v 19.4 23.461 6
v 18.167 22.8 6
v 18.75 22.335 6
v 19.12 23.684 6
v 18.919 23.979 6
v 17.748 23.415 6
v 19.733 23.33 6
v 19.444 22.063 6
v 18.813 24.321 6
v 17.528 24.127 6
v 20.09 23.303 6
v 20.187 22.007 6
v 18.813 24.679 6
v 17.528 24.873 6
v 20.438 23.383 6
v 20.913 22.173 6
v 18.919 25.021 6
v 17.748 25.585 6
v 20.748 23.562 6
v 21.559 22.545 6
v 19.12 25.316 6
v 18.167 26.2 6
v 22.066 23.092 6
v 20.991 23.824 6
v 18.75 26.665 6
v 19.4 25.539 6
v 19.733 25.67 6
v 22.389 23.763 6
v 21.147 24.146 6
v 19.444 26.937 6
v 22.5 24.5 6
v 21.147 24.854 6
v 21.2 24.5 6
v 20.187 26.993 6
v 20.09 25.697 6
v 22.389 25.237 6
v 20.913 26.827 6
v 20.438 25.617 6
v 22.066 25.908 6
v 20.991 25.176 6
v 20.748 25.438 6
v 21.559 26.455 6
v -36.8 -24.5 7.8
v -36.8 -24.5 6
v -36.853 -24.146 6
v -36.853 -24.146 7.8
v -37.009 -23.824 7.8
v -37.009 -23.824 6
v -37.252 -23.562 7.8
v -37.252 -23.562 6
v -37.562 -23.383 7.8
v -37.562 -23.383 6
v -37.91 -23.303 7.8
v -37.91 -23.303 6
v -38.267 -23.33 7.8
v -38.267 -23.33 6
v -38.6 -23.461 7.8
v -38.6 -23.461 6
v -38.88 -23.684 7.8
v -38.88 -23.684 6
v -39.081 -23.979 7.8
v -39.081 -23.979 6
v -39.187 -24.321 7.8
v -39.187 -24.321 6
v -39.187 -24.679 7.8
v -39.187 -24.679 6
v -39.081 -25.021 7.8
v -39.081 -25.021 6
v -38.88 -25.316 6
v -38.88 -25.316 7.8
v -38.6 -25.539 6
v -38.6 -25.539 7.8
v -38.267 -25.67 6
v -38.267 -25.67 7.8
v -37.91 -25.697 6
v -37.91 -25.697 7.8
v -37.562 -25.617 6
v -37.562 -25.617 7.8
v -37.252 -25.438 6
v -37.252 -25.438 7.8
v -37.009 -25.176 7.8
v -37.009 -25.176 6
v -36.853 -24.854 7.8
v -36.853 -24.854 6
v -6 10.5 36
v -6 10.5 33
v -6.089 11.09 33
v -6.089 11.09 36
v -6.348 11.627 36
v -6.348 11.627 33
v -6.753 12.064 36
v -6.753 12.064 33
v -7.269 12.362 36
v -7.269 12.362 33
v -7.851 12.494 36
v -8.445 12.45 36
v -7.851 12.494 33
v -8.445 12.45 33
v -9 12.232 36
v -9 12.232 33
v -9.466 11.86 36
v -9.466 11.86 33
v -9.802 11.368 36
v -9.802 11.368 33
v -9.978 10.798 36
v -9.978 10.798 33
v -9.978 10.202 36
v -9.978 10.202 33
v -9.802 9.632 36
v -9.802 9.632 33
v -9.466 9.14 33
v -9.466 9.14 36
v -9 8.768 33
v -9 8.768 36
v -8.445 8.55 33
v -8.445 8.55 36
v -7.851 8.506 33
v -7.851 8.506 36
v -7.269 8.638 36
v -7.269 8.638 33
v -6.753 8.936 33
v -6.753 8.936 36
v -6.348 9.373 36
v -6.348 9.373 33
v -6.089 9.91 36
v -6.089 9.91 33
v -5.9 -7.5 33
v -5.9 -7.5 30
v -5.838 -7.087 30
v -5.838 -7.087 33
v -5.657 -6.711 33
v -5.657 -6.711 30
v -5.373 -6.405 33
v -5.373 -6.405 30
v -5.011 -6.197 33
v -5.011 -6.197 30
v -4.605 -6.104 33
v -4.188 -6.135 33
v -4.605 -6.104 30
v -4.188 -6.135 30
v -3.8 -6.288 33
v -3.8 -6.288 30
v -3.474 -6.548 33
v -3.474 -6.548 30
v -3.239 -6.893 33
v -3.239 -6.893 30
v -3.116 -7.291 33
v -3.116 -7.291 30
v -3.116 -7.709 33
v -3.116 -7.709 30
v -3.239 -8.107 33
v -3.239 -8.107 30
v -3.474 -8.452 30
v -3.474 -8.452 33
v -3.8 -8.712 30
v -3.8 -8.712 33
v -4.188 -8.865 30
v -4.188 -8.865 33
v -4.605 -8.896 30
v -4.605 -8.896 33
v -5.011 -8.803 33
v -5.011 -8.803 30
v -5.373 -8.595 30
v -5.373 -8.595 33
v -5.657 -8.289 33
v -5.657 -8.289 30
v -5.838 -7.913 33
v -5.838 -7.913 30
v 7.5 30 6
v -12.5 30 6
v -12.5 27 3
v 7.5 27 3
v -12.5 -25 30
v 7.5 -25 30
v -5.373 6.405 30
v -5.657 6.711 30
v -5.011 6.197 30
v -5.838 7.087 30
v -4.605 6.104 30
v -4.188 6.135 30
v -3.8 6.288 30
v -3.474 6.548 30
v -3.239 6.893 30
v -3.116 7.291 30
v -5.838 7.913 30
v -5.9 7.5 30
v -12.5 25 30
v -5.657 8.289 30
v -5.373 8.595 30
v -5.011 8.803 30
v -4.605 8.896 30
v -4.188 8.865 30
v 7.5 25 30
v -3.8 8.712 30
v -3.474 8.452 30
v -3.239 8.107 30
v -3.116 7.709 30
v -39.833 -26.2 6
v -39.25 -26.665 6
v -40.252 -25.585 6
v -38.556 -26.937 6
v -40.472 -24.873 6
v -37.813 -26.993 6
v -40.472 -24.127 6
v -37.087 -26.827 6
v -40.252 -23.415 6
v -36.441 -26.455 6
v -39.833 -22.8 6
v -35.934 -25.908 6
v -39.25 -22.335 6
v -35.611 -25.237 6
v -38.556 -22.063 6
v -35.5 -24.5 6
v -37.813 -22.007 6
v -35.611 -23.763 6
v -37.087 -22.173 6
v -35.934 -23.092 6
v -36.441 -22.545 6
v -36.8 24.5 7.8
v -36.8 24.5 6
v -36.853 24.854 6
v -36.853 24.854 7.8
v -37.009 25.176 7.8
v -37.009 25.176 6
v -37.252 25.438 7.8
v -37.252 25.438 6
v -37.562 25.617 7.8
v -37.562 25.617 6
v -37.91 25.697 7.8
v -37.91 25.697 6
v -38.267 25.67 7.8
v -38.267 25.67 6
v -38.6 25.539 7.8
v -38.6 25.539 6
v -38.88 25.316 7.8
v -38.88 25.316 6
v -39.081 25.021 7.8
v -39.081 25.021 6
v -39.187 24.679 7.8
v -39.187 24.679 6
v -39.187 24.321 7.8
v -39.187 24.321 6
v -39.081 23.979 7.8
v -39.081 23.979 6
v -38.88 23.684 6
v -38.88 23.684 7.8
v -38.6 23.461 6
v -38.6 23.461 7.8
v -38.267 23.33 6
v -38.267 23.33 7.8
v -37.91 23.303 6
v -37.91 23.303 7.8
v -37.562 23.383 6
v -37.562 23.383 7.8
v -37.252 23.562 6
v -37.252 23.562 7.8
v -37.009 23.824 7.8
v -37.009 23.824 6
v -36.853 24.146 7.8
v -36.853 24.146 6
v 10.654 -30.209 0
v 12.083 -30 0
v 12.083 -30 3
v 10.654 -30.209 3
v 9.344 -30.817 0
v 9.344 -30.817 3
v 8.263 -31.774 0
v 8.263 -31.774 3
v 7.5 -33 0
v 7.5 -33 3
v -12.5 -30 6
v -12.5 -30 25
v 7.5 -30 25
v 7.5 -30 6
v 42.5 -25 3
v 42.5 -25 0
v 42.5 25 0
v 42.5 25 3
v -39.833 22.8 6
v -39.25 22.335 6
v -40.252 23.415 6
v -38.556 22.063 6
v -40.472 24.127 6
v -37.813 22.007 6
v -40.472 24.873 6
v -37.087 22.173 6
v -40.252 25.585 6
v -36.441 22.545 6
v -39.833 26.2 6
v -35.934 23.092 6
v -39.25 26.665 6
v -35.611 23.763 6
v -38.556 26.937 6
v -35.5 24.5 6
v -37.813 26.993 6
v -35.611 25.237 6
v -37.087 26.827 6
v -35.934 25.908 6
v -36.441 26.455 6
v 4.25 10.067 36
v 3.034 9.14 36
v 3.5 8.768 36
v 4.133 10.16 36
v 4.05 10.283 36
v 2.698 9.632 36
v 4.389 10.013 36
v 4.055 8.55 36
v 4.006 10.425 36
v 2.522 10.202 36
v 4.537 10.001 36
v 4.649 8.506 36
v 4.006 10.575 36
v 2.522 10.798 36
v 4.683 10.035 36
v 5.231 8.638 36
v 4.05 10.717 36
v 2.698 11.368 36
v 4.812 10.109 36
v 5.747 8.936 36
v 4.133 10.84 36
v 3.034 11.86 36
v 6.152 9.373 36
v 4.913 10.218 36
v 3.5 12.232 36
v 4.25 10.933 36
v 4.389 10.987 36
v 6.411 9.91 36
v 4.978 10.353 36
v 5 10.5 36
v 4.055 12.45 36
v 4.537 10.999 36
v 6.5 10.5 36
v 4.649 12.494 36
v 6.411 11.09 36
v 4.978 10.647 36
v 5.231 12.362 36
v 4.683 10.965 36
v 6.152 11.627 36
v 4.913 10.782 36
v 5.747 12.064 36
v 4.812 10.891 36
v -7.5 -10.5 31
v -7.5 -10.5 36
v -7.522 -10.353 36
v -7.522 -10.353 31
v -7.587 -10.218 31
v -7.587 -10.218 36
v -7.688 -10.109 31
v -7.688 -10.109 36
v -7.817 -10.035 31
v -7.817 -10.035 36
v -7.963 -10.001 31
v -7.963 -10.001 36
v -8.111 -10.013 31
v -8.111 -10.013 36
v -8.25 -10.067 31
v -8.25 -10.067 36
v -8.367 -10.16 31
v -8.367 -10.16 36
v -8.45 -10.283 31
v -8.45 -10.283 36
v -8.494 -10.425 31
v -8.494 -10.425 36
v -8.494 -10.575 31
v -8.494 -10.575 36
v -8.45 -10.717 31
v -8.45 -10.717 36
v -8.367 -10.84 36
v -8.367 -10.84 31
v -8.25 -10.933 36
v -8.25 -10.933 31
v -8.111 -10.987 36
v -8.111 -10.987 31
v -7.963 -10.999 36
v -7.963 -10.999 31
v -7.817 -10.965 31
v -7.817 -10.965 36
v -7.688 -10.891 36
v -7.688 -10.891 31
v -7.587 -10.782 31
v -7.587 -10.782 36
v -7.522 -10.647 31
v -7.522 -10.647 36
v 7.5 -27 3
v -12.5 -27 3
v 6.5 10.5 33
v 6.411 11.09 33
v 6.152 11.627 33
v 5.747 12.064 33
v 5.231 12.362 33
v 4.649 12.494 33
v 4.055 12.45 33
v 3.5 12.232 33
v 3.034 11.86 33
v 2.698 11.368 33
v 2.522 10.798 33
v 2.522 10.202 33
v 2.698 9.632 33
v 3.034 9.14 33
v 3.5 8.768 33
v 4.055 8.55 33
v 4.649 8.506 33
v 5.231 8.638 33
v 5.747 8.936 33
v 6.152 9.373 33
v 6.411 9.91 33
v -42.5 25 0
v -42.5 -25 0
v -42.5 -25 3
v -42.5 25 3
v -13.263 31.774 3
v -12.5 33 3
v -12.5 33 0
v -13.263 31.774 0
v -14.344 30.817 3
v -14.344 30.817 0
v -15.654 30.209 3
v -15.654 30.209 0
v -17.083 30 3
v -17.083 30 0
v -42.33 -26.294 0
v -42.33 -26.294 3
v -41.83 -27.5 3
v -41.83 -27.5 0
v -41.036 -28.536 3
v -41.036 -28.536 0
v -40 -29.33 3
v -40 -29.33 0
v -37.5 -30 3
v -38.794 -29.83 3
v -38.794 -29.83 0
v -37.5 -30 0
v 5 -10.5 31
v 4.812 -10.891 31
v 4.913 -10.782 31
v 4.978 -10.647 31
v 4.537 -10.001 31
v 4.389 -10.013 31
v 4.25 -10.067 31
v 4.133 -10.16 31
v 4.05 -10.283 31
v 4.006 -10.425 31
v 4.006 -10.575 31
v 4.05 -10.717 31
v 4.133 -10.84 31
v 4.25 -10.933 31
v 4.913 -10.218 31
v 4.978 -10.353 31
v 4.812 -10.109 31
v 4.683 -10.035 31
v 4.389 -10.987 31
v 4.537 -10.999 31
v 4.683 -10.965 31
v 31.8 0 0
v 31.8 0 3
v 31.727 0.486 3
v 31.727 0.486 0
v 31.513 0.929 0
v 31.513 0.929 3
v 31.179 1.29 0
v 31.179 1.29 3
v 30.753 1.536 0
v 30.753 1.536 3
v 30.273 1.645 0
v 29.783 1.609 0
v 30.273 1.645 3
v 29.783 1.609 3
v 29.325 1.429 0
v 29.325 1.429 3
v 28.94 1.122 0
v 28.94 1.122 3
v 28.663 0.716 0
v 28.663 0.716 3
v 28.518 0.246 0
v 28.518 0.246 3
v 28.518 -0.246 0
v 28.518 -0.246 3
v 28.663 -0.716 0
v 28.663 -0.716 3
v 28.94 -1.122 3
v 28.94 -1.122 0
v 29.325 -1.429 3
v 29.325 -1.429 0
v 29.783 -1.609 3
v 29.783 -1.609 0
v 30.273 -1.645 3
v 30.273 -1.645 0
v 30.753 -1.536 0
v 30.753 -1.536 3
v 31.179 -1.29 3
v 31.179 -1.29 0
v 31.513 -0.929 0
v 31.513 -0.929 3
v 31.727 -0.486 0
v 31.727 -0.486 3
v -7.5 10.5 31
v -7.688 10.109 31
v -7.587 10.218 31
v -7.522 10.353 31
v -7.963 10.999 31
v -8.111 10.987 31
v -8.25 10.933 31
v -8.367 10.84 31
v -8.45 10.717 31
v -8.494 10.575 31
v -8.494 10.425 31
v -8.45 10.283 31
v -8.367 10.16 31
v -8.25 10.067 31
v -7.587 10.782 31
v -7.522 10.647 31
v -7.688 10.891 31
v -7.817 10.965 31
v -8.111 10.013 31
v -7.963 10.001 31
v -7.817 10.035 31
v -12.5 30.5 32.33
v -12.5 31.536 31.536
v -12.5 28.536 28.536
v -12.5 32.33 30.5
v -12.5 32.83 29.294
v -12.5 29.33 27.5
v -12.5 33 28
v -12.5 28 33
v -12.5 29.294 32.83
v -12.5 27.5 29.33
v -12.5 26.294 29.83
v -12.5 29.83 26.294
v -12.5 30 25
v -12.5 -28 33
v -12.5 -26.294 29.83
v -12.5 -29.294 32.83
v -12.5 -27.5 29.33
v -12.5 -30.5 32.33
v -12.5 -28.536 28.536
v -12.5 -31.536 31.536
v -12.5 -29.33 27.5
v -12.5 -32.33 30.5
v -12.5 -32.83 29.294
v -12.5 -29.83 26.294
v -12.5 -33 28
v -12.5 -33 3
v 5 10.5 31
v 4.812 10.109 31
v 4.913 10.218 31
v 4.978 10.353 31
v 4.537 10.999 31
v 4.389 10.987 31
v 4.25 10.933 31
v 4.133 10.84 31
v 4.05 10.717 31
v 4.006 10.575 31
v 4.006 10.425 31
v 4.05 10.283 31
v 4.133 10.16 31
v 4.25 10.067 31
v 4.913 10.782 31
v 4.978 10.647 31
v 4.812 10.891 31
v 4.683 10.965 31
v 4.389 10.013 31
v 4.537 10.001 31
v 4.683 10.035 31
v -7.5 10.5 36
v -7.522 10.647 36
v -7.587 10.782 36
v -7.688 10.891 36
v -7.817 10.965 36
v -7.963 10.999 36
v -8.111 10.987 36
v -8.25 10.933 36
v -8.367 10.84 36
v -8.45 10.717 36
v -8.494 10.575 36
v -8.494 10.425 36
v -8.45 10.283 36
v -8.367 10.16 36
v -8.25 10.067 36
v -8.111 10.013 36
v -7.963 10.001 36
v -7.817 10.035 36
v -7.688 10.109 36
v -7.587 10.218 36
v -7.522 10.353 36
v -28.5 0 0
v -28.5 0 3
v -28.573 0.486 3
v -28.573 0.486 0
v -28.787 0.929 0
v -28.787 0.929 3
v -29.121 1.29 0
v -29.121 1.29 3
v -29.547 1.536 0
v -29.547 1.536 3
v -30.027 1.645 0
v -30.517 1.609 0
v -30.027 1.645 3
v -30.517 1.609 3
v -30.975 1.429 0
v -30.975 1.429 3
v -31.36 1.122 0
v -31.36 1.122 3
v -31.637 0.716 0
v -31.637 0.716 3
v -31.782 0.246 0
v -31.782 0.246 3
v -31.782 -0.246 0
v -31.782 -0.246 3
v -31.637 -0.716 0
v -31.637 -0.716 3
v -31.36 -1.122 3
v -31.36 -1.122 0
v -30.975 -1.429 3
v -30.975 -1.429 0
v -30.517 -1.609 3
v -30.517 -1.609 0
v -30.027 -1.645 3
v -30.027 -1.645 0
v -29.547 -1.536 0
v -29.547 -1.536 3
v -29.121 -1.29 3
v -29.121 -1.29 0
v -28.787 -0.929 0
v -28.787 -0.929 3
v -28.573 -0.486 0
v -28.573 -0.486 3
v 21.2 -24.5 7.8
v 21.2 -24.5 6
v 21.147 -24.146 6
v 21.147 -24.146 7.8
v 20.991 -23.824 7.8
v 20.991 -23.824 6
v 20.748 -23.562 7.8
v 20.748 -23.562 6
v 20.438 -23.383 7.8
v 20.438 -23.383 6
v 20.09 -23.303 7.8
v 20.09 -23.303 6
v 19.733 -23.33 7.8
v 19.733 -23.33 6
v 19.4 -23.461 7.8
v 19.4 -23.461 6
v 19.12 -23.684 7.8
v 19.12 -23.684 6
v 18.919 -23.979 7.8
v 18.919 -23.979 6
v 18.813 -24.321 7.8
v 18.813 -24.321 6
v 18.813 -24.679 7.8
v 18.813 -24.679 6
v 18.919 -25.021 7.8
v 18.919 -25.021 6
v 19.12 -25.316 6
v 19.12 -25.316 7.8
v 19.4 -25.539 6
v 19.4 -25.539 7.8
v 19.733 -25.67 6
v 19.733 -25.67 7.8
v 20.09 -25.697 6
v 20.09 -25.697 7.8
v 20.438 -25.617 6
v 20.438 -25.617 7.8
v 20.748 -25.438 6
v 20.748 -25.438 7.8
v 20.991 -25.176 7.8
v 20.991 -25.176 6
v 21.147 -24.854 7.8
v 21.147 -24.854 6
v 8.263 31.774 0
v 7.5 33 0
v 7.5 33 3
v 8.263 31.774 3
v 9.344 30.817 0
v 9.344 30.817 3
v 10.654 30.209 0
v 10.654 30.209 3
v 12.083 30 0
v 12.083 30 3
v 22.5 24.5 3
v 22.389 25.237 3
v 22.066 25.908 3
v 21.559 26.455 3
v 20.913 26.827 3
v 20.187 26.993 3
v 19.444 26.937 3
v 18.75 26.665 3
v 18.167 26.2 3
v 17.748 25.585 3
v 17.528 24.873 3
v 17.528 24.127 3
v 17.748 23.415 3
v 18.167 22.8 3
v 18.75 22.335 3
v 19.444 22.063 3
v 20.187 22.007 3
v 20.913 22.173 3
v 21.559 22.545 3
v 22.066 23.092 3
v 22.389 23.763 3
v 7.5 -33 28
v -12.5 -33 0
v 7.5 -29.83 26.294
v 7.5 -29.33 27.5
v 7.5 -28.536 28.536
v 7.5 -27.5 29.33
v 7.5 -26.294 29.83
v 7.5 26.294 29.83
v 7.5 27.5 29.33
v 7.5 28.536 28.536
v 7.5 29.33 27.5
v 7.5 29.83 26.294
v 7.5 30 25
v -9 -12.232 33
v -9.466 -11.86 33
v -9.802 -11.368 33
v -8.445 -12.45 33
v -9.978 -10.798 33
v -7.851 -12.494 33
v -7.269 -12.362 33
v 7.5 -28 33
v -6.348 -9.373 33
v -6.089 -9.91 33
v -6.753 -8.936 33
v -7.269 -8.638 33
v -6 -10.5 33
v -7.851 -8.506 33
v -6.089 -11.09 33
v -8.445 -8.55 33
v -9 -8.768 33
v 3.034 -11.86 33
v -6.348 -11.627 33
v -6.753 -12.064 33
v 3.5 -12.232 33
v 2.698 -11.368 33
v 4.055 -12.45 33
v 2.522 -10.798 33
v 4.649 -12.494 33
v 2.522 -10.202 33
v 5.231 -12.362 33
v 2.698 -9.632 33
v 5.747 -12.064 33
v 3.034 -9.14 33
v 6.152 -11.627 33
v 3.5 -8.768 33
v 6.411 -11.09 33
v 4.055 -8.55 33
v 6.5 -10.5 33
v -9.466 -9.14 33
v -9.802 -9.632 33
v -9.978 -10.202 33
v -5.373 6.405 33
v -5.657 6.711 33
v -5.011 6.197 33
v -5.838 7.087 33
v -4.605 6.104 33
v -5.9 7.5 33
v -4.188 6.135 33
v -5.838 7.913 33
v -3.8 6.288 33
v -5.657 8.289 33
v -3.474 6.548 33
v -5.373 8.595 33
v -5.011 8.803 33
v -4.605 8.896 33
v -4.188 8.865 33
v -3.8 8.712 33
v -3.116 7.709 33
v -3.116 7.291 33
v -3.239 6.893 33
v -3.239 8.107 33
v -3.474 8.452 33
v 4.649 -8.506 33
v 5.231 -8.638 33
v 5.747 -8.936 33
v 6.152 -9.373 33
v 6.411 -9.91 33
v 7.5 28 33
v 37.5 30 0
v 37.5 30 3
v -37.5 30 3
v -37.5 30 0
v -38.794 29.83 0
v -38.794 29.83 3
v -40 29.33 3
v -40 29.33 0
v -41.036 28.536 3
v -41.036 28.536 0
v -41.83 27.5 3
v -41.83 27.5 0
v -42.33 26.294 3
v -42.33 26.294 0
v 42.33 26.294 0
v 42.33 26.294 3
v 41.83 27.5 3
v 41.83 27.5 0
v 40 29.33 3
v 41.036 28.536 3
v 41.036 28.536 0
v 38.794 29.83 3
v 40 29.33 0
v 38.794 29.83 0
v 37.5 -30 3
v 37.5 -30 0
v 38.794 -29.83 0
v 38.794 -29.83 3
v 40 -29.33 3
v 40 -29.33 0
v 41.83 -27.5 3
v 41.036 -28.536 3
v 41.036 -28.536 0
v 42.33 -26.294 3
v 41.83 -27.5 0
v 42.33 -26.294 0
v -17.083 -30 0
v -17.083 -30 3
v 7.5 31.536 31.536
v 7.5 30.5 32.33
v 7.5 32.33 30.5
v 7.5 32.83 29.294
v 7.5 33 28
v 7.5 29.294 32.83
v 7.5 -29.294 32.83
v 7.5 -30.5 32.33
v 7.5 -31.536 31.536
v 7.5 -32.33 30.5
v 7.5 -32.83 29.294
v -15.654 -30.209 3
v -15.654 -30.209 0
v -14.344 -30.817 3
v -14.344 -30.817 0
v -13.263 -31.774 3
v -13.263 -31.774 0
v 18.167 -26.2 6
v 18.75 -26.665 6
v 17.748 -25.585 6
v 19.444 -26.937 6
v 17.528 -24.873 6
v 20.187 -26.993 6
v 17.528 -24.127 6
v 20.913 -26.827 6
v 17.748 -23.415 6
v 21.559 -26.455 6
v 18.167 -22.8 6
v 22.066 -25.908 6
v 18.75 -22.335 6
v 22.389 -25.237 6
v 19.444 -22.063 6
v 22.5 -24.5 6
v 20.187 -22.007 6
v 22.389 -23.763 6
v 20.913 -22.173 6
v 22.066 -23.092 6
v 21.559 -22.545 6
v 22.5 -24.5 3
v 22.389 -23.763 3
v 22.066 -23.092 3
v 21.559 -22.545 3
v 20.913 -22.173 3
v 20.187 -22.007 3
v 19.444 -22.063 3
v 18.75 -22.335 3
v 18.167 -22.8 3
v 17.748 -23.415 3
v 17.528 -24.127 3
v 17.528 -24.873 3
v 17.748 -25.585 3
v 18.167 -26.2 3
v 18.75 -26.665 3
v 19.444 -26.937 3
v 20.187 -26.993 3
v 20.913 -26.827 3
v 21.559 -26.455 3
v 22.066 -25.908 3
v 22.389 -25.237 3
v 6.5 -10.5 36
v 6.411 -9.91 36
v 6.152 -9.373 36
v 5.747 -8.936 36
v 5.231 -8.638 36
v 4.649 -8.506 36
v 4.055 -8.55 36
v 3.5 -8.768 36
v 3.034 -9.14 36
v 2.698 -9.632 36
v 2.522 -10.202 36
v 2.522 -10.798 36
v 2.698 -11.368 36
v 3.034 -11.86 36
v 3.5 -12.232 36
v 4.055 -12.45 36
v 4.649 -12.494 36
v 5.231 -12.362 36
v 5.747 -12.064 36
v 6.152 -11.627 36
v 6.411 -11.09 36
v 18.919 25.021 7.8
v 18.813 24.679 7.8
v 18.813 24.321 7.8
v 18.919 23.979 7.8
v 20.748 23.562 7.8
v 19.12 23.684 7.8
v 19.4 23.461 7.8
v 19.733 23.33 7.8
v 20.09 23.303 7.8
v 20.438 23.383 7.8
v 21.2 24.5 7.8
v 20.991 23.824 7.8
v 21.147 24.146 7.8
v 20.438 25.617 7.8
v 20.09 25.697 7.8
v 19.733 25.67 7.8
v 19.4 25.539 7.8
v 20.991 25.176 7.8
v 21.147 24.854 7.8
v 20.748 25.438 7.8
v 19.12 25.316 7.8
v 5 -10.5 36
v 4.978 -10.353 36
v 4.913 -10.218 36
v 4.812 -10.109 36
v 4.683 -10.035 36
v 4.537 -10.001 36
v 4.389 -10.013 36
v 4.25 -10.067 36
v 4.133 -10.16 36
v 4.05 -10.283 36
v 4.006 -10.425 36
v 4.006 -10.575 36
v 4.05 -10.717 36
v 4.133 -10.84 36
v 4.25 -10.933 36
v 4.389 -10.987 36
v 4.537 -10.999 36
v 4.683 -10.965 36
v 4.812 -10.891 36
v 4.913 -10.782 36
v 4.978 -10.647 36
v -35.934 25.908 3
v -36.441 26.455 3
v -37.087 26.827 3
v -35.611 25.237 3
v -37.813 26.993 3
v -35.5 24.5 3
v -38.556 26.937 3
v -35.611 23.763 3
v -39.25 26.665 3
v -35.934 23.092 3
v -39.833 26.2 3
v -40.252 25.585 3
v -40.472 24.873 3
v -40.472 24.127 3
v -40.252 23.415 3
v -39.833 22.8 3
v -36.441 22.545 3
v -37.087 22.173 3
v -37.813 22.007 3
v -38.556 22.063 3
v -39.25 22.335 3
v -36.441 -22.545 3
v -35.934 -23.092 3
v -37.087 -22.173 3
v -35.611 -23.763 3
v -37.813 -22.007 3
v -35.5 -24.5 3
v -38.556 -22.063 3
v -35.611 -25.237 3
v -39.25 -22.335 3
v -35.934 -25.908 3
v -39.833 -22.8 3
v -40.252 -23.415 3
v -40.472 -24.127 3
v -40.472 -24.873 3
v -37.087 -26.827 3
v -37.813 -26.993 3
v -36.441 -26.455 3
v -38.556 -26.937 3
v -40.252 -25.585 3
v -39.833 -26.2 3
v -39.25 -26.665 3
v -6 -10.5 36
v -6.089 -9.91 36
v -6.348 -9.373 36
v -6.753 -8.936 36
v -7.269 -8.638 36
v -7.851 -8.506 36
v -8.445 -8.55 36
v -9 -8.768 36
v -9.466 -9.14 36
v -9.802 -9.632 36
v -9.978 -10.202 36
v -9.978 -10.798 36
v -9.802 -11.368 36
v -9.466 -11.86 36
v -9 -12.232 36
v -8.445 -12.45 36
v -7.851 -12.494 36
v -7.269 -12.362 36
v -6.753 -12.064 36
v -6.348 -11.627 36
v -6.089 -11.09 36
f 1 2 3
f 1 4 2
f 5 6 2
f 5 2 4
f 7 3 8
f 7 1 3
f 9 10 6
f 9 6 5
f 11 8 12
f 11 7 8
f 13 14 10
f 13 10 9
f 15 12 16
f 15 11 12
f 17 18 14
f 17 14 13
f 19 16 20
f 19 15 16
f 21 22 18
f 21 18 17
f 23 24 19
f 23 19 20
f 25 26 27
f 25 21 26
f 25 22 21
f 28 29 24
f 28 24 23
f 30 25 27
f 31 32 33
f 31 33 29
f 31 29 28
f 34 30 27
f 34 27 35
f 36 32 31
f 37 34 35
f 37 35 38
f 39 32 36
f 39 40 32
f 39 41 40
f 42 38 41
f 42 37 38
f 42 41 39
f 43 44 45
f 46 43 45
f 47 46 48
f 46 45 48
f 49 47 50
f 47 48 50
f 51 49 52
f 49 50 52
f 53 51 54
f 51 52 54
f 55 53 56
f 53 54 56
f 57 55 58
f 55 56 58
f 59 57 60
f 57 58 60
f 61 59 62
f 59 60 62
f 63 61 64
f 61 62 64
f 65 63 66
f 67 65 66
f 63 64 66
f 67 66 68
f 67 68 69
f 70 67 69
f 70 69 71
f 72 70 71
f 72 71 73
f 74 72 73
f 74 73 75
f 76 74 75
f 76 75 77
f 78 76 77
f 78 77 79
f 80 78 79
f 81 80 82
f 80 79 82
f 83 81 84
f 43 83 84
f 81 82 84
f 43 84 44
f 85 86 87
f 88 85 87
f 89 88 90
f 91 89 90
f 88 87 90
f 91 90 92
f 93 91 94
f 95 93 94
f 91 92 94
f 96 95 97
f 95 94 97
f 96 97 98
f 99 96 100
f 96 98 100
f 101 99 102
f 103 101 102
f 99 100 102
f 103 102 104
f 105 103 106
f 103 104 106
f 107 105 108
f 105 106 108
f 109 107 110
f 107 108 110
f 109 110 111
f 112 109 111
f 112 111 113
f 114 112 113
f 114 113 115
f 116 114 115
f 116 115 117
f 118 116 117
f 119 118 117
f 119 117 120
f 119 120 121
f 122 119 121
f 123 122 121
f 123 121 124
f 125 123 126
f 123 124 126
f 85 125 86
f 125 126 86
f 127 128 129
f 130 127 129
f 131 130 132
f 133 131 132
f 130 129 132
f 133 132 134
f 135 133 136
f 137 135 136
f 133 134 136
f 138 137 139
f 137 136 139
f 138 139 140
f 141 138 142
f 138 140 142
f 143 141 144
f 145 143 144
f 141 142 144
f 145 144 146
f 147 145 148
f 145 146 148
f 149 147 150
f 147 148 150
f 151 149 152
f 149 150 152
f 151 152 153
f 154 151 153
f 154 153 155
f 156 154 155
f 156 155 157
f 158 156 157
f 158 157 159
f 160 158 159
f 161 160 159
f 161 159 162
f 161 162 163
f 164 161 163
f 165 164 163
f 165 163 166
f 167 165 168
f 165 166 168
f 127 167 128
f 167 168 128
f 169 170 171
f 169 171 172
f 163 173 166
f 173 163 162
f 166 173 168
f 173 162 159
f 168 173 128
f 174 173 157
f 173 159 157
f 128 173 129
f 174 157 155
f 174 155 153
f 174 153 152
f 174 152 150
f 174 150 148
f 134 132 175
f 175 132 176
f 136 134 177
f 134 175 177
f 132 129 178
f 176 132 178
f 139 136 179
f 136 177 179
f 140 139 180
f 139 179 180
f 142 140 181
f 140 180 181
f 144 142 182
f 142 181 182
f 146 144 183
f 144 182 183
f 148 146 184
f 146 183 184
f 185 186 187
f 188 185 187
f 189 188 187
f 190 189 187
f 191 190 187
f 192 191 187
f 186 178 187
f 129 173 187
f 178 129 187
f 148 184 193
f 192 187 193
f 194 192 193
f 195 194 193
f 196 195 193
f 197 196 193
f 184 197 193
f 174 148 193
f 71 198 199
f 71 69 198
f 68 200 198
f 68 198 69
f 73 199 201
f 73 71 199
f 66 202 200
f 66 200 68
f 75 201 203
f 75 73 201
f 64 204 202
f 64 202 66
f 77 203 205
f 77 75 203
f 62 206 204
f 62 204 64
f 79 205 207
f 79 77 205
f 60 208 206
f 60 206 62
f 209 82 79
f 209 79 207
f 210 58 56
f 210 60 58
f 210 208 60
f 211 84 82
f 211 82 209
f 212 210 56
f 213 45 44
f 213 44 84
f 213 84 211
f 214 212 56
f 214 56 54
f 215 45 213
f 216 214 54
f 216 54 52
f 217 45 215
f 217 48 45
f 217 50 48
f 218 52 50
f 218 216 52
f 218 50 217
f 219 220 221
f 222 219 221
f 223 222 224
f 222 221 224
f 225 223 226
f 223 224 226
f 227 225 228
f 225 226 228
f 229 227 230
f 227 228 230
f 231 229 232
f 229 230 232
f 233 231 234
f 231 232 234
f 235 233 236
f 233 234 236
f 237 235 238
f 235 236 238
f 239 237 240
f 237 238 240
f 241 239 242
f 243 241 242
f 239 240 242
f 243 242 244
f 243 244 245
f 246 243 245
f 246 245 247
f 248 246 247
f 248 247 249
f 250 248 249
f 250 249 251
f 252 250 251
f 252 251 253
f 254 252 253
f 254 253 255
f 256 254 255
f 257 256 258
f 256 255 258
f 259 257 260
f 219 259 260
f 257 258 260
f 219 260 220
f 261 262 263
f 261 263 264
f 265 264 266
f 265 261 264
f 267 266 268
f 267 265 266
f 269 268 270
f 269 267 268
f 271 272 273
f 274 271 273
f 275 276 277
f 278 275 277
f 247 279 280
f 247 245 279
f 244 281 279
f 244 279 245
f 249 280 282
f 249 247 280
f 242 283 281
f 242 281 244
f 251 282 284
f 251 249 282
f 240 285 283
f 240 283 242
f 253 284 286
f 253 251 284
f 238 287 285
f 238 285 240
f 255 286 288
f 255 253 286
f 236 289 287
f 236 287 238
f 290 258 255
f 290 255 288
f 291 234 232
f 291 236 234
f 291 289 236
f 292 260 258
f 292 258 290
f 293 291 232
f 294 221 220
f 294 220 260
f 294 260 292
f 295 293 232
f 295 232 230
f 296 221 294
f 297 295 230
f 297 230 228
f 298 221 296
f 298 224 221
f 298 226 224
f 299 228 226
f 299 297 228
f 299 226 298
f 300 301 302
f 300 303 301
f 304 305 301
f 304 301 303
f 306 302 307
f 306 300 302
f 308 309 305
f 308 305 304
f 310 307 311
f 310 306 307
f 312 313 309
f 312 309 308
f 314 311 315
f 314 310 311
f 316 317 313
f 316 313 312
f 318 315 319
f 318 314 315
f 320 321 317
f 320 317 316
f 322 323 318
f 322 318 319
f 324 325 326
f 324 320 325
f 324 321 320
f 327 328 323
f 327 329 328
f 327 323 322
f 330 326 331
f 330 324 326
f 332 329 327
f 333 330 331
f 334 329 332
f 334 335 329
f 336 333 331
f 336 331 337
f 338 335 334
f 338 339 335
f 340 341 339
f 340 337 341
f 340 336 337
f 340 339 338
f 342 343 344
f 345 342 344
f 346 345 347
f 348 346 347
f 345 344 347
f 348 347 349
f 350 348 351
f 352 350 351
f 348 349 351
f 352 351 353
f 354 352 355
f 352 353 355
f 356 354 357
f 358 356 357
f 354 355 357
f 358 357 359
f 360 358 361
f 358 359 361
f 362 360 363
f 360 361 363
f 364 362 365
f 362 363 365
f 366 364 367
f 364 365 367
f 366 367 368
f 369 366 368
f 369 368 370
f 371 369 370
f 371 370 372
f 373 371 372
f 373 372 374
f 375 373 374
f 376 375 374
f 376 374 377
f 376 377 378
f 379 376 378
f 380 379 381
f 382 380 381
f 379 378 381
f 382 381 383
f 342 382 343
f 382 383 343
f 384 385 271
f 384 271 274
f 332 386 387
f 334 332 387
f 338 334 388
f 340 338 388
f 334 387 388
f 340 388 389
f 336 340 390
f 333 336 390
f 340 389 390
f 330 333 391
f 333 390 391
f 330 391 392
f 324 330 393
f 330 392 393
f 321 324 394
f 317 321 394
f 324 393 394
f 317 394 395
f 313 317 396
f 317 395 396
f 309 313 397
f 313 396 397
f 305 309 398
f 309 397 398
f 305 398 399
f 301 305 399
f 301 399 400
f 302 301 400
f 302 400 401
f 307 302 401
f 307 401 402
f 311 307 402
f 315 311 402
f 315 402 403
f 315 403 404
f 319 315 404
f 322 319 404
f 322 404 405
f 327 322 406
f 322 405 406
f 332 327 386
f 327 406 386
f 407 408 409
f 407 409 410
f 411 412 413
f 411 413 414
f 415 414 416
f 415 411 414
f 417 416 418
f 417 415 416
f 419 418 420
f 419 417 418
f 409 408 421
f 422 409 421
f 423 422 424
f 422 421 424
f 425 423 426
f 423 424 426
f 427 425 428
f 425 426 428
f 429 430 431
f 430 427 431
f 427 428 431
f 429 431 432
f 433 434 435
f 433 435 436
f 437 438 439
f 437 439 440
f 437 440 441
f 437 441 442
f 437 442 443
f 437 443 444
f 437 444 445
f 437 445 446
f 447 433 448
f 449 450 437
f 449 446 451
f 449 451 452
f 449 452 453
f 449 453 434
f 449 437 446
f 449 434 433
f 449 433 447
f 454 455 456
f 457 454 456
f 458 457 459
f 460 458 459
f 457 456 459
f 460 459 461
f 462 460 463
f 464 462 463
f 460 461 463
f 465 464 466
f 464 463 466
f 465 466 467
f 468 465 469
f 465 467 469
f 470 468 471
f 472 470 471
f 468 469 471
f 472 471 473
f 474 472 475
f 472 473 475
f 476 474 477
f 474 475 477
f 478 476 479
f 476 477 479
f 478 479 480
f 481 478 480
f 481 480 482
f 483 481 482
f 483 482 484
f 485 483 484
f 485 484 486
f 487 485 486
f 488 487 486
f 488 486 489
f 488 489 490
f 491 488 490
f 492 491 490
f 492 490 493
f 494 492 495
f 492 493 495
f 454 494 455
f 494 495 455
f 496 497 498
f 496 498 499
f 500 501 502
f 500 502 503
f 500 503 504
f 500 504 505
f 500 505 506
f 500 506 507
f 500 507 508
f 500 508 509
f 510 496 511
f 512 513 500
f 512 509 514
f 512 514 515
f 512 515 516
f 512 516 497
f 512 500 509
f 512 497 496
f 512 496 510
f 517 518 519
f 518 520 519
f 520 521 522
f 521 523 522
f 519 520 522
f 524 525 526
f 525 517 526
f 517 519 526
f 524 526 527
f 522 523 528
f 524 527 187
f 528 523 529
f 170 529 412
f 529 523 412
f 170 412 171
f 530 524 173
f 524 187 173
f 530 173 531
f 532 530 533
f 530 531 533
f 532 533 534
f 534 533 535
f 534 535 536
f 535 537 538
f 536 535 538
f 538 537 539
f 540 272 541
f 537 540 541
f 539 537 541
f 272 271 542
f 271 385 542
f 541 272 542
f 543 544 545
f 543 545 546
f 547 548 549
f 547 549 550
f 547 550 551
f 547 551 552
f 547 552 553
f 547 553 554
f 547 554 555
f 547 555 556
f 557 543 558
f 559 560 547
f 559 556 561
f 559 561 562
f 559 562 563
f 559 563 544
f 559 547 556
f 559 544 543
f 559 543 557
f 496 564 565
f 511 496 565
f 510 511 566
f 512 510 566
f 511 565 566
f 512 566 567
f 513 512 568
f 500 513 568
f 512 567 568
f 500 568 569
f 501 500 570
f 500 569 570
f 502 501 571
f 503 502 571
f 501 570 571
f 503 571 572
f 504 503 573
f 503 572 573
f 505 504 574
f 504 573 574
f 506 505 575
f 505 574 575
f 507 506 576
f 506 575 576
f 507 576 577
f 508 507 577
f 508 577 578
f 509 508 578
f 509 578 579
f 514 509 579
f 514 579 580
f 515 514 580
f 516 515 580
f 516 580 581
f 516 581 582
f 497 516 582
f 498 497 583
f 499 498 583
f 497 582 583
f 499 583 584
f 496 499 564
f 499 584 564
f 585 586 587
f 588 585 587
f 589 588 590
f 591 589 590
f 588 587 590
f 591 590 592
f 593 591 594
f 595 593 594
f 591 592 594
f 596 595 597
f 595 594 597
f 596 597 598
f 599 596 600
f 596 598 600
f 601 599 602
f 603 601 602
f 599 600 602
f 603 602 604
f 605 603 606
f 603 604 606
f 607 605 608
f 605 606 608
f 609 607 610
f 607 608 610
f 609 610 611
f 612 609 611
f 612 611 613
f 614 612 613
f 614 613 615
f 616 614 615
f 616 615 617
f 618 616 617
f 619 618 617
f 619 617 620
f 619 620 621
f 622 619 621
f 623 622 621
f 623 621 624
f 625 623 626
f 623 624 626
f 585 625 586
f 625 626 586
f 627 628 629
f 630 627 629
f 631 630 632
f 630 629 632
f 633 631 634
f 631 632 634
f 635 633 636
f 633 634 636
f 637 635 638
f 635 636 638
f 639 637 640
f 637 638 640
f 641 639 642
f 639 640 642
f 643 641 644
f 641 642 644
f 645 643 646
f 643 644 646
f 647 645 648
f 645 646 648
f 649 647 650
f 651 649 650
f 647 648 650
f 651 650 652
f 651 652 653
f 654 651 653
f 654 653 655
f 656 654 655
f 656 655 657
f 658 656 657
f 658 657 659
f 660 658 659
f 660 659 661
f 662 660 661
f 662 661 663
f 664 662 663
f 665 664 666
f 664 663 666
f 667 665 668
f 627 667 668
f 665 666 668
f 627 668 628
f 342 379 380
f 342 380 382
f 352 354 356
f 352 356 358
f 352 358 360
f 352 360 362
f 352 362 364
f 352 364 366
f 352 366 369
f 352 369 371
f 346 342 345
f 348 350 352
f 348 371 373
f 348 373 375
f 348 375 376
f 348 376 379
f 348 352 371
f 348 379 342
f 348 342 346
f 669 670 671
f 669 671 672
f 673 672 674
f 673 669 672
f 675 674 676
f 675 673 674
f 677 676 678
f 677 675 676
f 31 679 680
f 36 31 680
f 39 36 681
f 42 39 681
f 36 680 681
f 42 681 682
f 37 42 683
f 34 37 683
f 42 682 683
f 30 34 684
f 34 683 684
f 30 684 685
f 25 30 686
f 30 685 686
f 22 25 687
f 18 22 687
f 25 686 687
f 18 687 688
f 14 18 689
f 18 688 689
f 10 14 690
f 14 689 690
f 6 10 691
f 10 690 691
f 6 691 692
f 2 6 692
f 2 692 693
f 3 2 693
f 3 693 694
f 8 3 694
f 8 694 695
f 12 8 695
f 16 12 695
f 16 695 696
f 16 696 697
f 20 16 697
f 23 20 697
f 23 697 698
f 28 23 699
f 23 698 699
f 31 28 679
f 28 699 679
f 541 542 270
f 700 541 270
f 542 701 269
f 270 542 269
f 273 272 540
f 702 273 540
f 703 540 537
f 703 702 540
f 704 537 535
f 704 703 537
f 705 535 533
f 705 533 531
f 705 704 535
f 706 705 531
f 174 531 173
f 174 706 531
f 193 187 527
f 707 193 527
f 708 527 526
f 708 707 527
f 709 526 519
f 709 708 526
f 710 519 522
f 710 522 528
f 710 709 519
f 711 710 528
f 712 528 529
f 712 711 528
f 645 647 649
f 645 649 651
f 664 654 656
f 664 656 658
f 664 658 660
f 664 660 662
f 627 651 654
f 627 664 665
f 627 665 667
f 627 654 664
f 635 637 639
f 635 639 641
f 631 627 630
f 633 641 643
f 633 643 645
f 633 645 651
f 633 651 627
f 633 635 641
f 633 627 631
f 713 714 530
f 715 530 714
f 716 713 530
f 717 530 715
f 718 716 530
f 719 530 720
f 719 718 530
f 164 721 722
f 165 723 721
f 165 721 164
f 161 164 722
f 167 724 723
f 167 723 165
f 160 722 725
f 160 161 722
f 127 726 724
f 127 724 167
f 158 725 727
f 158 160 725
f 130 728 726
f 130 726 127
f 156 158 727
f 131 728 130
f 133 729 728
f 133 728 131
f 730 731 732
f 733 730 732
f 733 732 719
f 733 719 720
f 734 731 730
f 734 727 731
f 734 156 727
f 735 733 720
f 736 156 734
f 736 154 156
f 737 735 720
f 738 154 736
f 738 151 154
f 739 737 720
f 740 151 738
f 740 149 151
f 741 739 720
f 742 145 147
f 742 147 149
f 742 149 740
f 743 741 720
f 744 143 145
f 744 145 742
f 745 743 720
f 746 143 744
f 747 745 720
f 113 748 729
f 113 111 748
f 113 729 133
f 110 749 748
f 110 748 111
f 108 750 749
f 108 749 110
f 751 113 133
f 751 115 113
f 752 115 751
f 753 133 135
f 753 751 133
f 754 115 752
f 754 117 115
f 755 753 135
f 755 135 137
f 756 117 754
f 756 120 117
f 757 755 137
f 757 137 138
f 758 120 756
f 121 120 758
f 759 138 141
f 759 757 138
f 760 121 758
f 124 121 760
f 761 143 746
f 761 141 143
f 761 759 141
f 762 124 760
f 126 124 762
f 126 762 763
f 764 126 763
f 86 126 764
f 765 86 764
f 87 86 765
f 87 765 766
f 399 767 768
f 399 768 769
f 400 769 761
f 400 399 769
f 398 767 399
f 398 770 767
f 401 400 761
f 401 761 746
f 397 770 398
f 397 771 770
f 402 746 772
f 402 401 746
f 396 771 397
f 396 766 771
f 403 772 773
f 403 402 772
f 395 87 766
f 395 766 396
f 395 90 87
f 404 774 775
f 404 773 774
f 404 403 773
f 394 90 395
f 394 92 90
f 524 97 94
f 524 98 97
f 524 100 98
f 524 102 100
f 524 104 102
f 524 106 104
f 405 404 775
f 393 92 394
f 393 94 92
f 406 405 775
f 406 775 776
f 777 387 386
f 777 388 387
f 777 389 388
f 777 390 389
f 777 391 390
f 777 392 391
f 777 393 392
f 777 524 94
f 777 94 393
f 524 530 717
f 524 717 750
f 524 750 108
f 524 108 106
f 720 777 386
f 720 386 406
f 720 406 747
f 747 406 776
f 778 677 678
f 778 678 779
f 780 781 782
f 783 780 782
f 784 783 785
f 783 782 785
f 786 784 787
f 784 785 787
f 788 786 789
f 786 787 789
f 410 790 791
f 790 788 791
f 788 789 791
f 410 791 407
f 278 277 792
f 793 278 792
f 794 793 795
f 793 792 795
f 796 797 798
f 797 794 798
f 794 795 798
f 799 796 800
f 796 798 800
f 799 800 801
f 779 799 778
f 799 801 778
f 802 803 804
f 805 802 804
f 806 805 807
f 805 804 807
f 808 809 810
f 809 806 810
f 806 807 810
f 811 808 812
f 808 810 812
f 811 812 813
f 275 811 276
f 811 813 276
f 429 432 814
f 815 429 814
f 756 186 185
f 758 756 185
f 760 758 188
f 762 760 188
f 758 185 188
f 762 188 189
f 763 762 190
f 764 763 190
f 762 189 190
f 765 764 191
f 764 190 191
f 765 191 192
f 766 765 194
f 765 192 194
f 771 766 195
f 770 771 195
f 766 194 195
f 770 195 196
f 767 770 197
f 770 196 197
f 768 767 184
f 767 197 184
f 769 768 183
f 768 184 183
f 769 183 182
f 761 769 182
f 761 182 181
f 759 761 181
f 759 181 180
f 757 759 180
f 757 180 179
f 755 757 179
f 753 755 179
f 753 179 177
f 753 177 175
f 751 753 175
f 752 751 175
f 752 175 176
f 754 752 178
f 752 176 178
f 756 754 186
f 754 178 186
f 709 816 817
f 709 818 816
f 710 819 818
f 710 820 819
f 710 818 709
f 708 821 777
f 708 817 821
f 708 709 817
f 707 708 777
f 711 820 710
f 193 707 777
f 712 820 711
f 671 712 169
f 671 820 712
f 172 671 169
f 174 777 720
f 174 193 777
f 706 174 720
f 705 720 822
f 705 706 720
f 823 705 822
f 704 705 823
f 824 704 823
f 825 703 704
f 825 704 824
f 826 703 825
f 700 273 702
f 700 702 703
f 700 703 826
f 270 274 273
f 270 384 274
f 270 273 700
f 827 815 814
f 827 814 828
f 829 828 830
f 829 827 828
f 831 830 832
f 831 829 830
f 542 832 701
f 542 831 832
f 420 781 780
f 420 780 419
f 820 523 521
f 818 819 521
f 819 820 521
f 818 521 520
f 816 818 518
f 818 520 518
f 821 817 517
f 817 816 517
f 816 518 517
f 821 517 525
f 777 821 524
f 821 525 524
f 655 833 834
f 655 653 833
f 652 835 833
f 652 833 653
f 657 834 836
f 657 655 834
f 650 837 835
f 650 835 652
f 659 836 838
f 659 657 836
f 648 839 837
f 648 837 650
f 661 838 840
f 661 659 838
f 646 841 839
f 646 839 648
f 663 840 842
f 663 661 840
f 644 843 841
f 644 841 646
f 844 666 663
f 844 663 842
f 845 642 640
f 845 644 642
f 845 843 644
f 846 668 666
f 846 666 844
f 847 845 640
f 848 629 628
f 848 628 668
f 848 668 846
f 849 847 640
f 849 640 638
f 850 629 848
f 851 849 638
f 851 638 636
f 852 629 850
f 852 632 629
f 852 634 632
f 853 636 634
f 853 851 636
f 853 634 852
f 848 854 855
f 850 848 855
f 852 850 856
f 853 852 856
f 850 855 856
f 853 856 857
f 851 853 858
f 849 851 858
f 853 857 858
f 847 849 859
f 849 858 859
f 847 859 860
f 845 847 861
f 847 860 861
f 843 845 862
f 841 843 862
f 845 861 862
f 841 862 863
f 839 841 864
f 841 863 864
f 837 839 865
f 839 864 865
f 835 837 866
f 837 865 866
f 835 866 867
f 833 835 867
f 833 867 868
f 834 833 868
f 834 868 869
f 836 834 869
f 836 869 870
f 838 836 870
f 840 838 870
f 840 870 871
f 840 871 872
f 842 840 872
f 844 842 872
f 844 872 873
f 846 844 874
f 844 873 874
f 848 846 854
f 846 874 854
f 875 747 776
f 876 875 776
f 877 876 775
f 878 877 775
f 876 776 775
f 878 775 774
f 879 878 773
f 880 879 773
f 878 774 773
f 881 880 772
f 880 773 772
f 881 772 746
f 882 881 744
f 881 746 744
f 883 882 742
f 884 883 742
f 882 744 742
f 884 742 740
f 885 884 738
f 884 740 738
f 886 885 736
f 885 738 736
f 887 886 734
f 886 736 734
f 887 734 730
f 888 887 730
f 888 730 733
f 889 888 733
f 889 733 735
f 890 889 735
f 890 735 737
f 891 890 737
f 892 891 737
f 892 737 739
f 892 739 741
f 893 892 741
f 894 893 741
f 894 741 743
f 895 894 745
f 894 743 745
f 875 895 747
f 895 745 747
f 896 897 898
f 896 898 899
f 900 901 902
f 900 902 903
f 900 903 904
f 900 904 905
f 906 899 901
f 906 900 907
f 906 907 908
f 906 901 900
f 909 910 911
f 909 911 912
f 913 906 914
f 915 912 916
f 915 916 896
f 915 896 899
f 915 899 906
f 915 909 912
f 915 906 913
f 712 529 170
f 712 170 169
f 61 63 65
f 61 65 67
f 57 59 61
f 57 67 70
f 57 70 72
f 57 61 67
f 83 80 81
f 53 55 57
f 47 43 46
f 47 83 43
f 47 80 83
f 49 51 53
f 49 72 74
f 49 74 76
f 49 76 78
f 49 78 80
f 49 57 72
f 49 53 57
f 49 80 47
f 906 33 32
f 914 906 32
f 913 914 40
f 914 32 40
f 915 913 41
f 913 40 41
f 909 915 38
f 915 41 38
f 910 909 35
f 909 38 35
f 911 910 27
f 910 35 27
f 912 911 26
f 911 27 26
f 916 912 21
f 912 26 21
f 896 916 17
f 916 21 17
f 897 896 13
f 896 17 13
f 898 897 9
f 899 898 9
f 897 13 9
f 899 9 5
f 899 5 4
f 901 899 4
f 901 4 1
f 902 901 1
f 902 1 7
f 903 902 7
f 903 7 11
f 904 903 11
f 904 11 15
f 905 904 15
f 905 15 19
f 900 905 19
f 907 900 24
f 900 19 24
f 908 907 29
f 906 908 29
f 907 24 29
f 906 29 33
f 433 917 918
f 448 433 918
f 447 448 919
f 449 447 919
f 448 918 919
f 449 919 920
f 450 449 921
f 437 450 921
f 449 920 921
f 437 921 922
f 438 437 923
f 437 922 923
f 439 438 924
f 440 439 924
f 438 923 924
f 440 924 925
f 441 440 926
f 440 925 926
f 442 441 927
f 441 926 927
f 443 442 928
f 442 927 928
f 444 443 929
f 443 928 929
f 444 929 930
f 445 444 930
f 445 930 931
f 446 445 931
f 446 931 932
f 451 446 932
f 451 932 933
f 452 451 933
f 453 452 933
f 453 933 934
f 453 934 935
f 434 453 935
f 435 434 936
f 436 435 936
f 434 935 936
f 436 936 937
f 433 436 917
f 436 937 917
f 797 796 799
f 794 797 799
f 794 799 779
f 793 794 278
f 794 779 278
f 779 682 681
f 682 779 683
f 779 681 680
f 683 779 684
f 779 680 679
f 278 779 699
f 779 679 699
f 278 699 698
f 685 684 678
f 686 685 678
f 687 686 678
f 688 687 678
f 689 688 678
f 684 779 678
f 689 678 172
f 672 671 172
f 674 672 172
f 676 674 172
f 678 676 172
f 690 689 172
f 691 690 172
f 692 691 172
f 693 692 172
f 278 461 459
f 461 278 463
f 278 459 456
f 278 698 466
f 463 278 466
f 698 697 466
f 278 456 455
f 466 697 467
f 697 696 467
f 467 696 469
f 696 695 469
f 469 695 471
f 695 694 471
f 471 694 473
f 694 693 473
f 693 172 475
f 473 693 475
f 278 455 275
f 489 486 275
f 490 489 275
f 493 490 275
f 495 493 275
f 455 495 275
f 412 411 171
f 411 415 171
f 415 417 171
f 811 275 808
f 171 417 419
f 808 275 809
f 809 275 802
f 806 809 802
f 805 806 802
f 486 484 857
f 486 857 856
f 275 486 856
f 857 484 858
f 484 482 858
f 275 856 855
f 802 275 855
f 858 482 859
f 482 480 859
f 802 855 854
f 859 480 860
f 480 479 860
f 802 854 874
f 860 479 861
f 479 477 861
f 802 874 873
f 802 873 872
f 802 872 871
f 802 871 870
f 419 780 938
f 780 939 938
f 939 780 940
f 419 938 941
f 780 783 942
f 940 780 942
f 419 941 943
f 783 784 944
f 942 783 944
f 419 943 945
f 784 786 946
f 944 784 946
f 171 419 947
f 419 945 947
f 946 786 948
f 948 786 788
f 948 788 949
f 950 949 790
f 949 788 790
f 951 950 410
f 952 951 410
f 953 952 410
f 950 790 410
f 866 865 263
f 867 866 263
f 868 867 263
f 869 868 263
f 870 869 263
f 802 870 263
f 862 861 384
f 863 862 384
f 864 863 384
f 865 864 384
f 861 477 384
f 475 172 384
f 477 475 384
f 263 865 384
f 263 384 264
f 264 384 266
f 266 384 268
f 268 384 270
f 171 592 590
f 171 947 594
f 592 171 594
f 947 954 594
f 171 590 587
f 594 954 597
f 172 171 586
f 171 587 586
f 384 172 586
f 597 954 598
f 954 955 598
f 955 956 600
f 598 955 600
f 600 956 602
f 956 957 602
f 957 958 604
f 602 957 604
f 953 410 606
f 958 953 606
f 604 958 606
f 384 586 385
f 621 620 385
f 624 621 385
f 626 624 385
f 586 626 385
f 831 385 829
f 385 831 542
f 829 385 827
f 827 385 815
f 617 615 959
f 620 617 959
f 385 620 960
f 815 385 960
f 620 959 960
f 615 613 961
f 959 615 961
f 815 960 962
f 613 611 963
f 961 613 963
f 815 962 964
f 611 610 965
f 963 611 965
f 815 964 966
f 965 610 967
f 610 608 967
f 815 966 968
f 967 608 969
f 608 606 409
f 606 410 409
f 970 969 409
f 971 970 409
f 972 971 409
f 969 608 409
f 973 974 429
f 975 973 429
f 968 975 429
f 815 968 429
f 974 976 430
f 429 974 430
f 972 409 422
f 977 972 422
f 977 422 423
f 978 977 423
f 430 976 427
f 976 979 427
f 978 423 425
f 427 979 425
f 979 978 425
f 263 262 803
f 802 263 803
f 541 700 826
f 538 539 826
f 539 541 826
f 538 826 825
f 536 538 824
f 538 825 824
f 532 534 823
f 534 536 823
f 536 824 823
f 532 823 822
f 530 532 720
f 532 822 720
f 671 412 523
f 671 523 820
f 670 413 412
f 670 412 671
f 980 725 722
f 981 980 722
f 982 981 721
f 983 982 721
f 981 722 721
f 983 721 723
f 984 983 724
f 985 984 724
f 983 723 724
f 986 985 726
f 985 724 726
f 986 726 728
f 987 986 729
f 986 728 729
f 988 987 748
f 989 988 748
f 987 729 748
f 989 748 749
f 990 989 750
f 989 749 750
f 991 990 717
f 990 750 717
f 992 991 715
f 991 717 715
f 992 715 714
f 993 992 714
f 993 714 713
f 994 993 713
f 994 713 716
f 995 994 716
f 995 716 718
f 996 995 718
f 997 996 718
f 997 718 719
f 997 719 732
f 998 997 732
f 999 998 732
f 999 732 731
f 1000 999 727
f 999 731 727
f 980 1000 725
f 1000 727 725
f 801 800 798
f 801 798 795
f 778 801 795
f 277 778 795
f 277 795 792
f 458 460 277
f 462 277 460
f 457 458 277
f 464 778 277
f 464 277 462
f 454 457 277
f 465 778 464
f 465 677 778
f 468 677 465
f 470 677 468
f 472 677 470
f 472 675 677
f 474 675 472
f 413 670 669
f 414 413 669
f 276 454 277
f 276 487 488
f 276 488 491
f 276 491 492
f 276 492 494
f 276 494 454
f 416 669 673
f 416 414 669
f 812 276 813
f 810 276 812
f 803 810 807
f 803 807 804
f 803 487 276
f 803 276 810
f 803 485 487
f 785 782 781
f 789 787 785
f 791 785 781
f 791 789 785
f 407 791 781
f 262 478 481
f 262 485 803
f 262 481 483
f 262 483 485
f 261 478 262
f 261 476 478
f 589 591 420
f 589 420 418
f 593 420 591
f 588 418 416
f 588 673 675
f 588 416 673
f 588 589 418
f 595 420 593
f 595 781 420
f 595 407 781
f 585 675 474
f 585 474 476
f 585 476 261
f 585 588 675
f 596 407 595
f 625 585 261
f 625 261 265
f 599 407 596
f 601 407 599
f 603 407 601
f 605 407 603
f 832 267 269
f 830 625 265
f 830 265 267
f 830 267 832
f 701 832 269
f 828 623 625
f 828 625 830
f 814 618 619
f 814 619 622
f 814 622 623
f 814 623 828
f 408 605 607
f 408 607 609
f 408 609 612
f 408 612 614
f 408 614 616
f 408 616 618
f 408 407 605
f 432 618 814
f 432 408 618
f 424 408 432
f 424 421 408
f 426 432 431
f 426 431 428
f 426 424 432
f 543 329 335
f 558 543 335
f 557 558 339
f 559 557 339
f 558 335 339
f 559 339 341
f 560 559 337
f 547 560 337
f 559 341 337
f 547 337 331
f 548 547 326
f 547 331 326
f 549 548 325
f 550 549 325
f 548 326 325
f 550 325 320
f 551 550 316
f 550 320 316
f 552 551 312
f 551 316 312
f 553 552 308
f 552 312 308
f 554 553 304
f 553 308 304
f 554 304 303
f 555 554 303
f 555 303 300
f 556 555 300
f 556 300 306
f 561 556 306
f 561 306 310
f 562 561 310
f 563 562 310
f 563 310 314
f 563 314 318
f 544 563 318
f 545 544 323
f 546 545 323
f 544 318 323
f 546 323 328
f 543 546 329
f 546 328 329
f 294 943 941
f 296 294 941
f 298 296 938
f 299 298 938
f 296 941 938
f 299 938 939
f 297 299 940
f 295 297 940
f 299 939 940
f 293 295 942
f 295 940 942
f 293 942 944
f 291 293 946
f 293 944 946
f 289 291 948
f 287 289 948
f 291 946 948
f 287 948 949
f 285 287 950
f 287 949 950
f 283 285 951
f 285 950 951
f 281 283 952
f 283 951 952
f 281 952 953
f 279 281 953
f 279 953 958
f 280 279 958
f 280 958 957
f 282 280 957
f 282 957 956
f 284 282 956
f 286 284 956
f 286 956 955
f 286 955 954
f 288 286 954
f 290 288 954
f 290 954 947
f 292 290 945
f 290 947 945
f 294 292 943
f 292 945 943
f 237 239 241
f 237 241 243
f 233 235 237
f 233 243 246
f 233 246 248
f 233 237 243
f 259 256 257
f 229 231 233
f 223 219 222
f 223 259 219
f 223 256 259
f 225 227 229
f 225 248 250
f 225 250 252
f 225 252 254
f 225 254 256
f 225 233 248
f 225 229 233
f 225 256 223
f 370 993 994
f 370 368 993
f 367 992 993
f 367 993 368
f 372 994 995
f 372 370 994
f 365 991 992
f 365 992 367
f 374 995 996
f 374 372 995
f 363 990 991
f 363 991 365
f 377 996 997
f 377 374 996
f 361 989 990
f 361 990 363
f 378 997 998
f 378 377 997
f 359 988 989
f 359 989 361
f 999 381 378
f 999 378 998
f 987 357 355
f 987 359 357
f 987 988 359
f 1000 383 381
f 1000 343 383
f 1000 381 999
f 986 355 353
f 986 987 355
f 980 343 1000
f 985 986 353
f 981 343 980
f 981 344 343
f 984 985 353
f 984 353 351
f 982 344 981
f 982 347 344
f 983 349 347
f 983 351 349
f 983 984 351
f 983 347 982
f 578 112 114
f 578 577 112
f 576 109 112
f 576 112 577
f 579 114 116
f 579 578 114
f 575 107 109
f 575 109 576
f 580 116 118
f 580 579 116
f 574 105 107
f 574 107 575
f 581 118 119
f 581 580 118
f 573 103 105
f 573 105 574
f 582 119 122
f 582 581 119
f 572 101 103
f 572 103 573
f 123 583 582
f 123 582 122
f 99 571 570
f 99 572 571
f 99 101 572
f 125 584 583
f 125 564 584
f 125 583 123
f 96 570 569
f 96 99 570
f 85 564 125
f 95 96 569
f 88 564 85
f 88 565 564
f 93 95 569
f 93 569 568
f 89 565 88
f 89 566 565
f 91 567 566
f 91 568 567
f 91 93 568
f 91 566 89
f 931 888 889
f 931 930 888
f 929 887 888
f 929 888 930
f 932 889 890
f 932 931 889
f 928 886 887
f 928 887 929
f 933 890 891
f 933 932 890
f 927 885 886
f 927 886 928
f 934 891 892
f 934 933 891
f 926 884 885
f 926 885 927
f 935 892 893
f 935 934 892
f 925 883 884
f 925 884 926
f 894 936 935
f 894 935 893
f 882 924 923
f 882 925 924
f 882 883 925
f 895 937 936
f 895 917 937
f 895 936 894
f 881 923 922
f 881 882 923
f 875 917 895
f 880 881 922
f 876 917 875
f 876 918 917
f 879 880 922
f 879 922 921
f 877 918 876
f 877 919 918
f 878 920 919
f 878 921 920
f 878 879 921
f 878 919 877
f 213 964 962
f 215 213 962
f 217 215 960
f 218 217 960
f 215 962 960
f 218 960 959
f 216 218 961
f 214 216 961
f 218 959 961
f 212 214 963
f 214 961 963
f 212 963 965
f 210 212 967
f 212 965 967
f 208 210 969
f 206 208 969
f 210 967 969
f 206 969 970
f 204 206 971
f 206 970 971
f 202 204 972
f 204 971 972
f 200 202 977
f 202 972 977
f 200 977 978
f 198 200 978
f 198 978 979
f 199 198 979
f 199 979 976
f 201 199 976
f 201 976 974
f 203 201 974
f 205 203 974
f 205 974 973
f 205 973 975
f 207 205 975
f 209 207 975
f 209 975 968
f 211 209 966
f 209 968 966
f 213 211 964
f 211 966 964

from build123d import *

# Parameters (mm, degrees)
SKETCH1_W           = 85
SKETCH1_H           = 60
BOSS_EXTRUDE1_DEPTH = 3
SKETCH2_R           = 2.5
BOSS_EXTRUDE2_DEPTH = 3
SKETCH3_R           = 1.2
BOSS_EXTRUDE3_DEPTH = 1.8
SKETCH5_W           = 20
SKETCH5_H           = 30
BOSS_EXTRUDE4_DEPTH = 3
SKETCH6_W           = 20
SKETCH6_H           = 66
BOSS_EXTRUDE5_DEPTH = 3
SKETCH7_R           = 2
BOSS_EXTRUDE6_DEPTH = 3
SKETCH8_R           = 0.5
CUT_EXTRUDE2_DEPTH  = 5
SKETCH9_R           = 1.65
CUT_EXTRUDE3_DEPTH  = 3
FILLET1_R           = 5
CHAMFER1_SIZE       = 3
SKETCH10_R          = 1.4
CUT_EXTRUDE4_DEPTH  = 3


with BuildPart() as part:
    # Sketch1 → Boss-Extrude1 (new body)
    with BuildSketch(Plane.XY):
        Rectangle(SKETCH1_W, SKETCH1_H)
    extrude(amount=BOSS_EXTRUDE1_DEPTH)

    # Sketch2 → Boss-Extrude2 (add)
    with BuildSketch(Plane.XY.offset(3)):
        with Locations((-38, -24.5)):
            Circle(SKETCH2_R)
        with Locations((-38, 24.5)):
            Circle(SKETCH2_R)
        with Locations((20, 24.5)):
            Circle(SKETCH2_R)
        with Locations((20, -24.5)):
            Circle(SKETCH2_R)
    extrude(amount=BOSS_EXTRUDE2_DEPTH)

    # Sketch3 → Boss-Extrude3 (add)
    with BuildSketch(Plane.XY.offset(6)):
        with Locations((-38, 24.5)):
            Circle(SKETCH3_R)
        with Locations((20, 24.5)):
            Circle(SKETCH3_R)
        with Locations((-38, -24.5)):
            Circle(SKETCH3_R)
        with Locations((20, -24.5)):
            Circle(SKETCH3_R)
    extrude(amount=BOSS_EXTRUDE3_DEPTH)

    # Sketch5 → Boss-Extrude4 (add)
    with BuildSketch(Plane.XZ.offset(30)):
        with Locations((-2.5, 15)):
            Rectangle(SKETCH5_W, SKETCH5_H)
    boss_extrude4 = extrude(amount=BOSS_EXTRUDE4_DEPTH)

    # Mirror1: Boss-Extrude4 across plane
    add(boss_extrude4.mirror(Plane.ZX))

    # Sketch6 → Boss-Extrude5 (add)
    with BuildSketch(Plane.XY.offset(30)):
        with Locations((-2.5, 0)):
            Rectangle(SKETCH6_W, SKETCH6_H)
    extrude(amount=BOSS_EXTRUDE5_DEPTH)

    # Sketch7 → Boss-Extrude6 (add)
    with BuildSketch(Plane.XY.offset(33)):
        with Locations((-8, -10.5)):
            Circle(SKETCH7_R)
        with Locations((4.5, -10.5)):
            Circle(SKETCH7_R)
        with Locations((-8, 10.5)):
            Circle(SKETCH7_R)
        with Locations((4.5, 10.5)):
            Circle(SKETCH7_R)
    extrude(amount=BOSS_EXTRUDE6_DEPTH)

    # Sketch8 → Cut-Extrude2 (cut)
    with BuildSketch(Plane.XY.offset(36)):
        with Locations((-8, 10.5)):
            Circle(SKETCH8_R)
        with Locations((4.5, 10.5)):
            Circle(SKETCH8_R)
        with Locations((-8, -10.5)):
            Circle(SKETCH8_R)
        with Locations((4.5, -10.5)):
            Circle(SKETCH8_R)
    extrude(amount=-CUT_EXTRUDE2_DEPTH, mode=Mode.SUBTRACT)

    # Sketch9 → Cut-Extrude3 (cut)
    with BuildSketch(Plane.XY.offset(3)):
        with Locations((-30.15, 0)):
            Circle(SKETCH9_R)
        with Locations((30.15, 0)):
            Circle(SKETCH9_R)
    extrude(amount=-CUT_EXTRUDE3_DEPTH, mode=Mode.SUBTRACT)

    # Fillet1
    # the kernel refuses this fillet: 5 mm, written as the material it adds along each edge
    with BuildSketch(Plane(origin=(7.5, -30, 0), x_dir=(0, -1, 0), z_dir=(0, 0, 1)), Plane(origin=(-12.5, -30, 3), x_dir=(0, -1, 0), z_dir=(0, 0, -1))) as fillet1_piece_1:
        with BuildLine():
            CenterArc((5, 4.582575695), FILLET1_R, 180, 66.421821522)
            Line((0, 4.582575695), (0, 0))
            Line((0, 0), (3, 0))
        make_face()
    extrude(amount=3)
    with BuildSketch(Plane(origin=(-12.5, 30, 3), x_dir=(-1, 0, 0), z_dir=(0, 0, -1))) as fillet1_piece_2:
        with BuildLine():
            CenterArc((4.582575695, 5), FILLET1_R, 203.578178478, 66.421821522)
            Line((0, 3), (0, 0))
            Line((0, 0), (4.582575695, 0))
        make_face()
    extrude(amount=3)
    with BuildSketch(Plane(origin=(7.5, 30, 0), x_dir=(0, 1, 0), z_dir=(0, 0, 1))) as fillet1_piece_3:
        with BuildLine():
            CenterArc((5, -4.582575695), FILLET1_R, 113.578178478, 66.421821522)
            Line((0, -4.582575695), (0, 0))
            Line((0, 0), (3, 0))
        make_face()
    extrude(amount=3)
    with BuildSketch(Plane(origin=(7.5, -30, 30), x_dir=(0, 1, 0), z_dir=(-1, 0, 0)), Plane(origin=(7.5, 30, 30), x_dir=(0, 0, -1), z_dir=(-1, 0, 0))) as fillet1_piece_4:
        with BuildLine():
            CenterArc((FILLET1_R, FILLET1_R), FILLET1_R, 180, 90)
            Line((0, FILLET1_R), (0, 0))
            Line((0, 0), (FILLET1_R, 0))
        make_face()
    extrude(amount=20)
    # the kernel refuses this fillet: 5 mm, written as the material it takes off along each edge
    with BuildSketch(Plane(origin=(42.5, 30, -12.5), x_dir=(-1, 0, 0), z_dir=(0, 0, 1)), Plane(origin=(42.5, -30, -12.5), x_dir=(0, 1, 0), z_dir=(0, 0, 1))) as fillet1_2_piece_1:
        with BuildLine():
            CenterArc((FILLET1_R, FILLET1_R), FILLET1_R, 180, 90)
            Line((0, FILLET1_R), (0, 0))
            Line((0, 0), (FILLET1_R, 0))
        make_face()
    extrude(amount=28, mode=Mode.SUBTRACT)
    with BuildSketch(Plane(origin=(-42.5, 30, -12.5), x_dir=(1, 0, 0), z_dir=(0, 0, 1)), Plane(origin=(-42.5, -30, -12.5), x_dir=(0, 1, 0), z_dir=(0, 0, 1))) as fillet1_2_piece_2:
        with BuildLine():
            CenterArc((FILLET1_R, -FILLET1_R), FILLET1_R, 90, 90)
            Line((0, -FILLET1_R), (0, 0))
            Line((0, 0), (FILLET1_R, 0))
        make_face()
    extrude(amount=28, mode=Mode.SUBTRACT)
    with BuildSketch(Plane(origin=(20, -33, 33), x_dir=(0, 0, -1), z_dir=(-1, 0, 0)), Plane(origin=(-25, 33, 33), x_dir=(0, 0, -1), z_dir=(1, 0, 0))) as fillet1_2_piece_3:
        with BuildLine():
            CenterArc((FILLET1_R, -FILLET1_R), FILLET1_R, 90, 90)
            Line((0, -FILLET1_R), (0, 0))
            Line((0, 0), (FILLET1_R, 0))
        make_face()
    extrude(amount=45, mode=Mode.SUBTRACT)

    # Chamfer1
    chamfer1_edges = [part.edges().sort_by_distance(p)[0] for p in [
        (-2.5, -30, 3),
        (-2.5, 30, 3),
    ]]
    chamfer(chamfer1_edges, length=CHAMFER1_SIZE)

    # Sketch10 → Cut-Extrude4 (cut)
    with BuildSketch(Plane(origin=(0, 0, 30), x_dir=(-1, 0, 0), z_dir=(0, 0, -1))):
        with Locations((4.5, -7.5)):
            Circle(SKETCH10_R)
        with Locations((4.5, 7.5)):
            Circle(SKETCH10_R)
    extrude(amount=-CUT_EXTRUDE4_DEPTH, mode=Mode.SUBTRACT)


solid = part.part
